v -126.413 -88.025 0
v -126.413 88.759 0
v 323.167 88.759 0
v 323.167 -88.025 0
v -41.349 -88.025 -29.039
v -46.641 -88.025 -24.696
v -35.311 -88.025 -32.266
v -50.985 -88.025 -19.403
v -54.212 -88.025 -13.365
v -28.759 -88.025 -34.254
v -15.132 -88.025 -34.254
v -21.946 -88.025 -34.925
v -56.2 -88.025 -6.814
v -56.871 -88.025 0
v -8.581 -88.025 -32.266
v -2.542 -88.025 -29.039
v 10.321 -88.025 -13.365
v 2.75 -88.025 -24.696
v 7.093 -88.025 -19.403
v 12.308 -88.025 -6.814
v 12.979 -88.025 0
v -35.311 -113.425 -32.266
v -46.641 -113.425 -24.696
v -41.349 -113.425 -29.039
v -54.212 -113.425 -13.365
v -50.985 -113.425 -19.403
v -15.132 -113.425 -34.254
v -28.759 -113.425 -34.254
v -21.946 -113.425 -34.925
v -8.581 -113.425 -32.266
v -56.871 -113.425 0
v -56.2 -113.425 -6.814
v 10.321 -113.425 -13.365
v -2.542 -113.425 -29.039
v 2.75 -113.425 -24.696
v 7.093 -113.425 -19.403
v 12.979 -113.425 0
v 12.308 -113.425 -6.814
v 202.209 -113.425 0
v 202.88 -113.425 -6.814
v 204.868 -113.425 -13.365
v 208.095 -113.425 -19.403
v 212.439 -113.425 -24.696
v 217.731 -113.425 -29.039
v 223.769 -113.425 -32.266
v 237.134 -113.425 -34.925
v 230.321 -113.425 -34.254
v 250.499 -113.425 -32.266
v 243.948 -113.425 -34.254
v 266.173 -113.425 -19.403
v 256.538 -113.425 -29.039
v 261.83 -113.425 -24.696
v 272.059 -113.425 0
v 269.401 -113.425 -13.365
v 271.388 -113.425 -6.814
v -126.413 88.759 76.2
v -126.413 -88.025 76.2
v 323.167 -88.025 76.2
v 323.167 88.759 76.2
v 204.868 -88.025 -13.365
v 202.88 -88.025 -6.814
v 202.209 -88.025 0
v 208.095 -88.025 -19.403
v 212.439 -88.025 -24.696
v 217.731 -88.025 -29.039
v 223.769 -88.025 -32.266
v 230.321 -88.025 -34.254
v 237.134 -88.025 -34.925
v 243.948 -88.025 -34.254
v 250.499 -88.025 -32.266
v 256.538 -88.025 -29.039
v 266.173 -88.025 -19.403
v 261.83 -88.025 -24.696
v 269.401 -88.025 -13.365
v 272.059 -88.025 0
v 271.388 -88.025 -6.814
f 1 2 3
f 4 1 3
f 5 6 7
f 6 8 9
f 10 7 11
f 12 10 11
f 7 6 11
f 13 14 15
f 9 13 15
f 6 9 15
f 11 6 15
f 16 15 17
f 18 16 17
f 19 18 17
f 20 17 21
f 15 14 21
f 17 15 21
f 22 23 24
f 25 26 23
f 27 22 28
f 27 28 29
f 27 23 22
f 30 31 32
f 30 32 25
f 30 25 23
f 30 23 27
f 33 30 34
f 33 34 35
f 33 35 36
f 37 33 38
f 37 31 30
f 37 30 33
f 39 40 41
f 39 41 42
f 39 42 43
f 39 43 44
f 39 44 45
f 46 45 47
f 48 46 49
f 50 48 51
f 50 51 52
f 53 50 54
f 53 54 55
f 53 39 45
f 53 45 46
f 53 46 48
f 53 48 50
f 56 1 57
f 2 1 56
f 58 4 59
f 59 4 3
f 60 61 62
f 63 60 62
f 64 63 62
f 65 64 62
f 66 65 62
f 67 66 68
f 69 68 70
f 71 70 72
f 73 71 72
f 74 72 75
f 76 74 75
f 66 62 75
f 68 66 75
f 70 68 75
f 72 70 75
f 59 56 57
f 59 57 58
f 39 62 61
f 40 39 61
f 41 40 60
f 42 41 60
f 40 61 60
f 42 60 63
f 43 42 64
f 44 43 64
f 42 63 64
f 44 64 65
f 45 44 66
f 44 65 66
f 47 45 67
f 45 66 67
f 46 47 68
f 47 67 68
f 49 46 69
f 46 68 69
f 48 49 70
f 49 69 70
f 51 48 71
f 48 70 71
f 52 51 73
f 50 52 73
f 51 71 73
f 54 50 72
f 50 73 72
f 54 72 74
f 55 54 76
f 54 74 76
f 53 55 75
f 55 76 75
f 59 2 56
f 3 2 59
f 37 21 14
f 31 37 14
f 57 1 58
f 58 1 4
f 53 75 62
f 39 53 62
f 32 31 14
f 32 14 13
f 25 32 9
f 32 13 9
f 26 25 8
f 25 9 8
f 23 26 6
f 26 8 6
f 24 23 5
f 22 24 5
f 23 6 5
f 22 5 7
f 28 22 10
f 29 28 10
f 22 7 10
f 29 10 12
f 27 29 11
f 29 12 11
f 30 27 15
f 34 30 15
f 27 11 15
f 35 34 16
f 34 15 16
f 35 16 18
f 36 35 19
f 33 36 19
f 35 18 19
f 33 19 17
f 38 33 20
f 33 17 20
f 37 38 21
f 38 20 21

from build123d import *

# Parameters (mm, degrees)
F0_W     = 449.58
F0_H     = 176.784
F1_DEPTH = 76.2
F3_DEPTH = 25.4


with BuildPart() as f1:
    # F0 (on Top) → F1 (new body)
    with BuildSketch(Plane.XY):
        with Locations((98.376634287, 0.3670174628)):
            Rectangle(F0_W, F0_H)
    extrude(amount=F1_DEPTH)


with BuildPart() as f3:
    # F2 (on face) → F3 (new body)
    with BuildSketch(Plane.XZ.offset(88.0249825372)):
        with BuildLine():
            ThreePointArc((-56.8707894564, 0), (-21.9457894564, -34.925), (12.9792105436, 0))
            Line((12.9792105436, 0), (-56.8707894564, 0))
        make_face()
    extrude(amount=F3_DEPTH)


with BuildPart() as f3b:
    # F2 (on face) → F3, piece 2 (new body)
    with BuildSketch(Plane.XZ.offset(88.0249825372)):
        with BuildLine():
            Line((272.0592105436, 0), (202.2092105436, 0))
            ThreePointArc((202.2092105436, 0), (237.1342105436, -34.925), (272.0592105436, 0))
        make_face()
    extrude(amount=F3_DEPTH)


solid = Compound([f1.part, f3.part, f3b.part])
